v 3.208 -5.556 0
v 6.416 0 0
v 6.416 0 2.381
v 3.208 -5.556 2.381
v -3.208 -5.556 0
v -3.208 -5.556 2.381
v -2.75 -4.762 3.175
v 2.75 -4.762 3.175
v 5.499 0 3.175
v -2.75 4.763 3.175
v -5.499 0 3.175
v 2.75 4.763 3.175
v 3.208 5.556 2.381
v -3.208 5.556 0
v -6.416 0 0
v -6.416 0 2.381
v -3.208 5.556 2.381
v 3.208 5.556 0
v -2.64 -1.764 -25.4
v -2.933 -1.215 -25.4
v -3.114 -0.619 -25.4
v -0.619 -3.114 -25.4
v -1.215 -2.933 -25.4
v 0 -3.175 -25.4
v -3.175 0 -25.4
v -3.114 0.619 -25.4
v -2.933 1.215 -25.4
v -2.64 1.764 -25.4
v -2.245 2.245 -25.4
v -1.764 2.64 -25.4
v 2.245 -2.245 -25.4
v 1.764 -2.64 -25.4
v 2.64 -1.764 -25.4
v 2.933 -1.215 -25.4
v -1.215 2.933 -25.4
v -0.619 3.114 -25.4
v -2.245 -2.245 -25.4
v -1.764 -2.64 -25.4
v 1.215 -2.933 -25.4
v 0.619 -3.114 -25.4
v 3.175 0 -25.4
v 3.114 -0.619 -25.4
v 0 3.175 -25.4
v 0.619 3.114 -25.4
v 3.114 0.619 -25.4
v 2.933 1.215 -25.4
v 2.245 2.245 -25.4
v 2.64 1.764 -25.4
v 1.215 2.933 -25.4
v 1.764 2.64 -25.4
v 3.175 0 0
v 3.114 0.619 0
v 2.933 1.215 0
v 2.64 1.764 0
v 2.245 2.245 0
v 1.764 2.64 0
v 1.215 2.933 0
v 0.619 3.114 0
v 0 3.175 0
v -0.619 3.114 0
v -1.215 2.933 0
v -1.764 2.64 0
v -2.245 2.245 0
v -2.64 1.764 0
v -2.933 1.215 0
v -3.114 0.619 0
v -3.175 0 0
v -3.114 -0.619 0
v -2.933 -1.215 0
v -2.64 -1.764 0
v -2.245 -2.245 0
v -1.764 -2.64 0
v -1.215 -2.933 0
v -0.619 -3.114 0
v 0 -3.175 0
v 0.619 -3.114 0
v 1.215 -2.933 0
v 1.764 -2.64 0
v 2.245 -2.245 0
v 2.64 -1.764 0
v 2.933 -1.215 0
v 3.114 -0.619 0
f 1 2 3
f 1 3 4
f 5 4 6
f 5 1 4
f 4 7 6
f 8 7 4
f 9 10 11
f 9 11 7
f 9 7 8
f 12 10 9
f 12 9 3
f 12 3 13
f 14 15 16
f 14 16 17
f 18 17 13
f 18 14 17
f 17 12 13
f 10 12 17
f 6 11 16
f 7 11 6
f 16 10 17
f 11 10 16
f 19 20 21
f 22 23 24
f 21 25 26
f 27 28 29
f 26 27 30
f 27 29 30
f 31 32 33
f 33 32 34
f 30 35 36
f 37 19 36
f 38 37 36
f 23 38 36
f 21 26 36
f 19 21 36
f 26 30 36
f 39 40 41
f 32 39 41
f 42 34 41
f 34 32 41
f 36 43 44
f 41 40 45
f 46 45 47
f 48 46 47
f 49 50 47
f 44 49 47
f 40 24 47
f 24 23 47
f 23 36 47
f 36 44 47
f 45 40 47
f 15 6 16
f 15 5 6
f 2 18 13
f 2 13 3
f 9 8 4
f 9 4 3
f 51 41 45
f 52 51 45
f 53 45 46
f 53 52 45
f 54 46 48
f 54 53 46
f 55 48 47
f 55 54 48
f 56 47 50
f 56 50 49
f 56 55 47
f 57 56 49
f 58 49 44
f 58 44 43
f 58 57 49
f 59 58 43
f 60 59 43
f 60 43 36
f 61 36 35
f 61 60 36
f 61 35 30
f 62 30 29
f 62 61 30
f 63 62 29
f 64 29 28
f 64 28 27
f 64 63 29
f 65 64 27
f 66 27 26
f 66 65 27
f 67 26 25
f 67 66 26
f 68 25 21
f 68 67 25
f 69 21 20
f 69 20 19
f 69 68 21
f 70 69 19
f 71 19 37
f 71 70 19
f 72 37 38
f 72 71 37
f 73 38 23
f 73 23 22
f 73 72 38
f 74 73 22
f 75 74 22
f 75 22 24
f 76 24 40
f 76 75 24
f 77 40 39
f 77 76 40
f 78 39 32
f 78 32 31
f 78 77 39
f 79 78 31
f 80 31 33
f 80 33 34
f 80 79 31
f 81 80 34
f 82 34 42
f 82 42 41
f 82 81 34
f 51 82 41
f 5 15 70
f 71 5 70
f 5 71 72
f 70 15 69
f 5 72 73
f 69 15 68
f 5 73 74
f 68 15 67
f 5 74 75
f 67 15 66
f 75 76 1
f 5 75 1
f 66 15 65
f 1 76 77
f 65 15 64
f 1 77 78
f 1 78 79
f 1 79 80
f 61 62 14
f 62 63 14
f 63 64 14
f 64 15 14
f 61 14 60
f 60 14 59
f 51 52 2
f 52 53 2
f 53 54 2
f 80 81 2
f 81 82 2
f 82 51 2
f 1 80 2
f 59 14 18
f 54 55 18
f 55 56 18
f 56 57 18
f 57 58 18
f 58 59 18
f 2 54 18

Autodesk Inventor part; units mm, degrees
ref_plane "YZ Plane" through (0, 0, 0) normal (1, 0, 0) x (0, 1, 0)
ref_plane "XZ Plane" through (0, 0, 0) normal (0, 1, 0) x (-1, 0, 0)
ref_plane "XY Plane" through (0, 0, 0) normal (0, 0, 1) x (1, 0, 0)
sketch "Sketch1" plane through (0, 0, 0) normal (0, 0, 1) x (1, 0, 0)
  circle A0 centre (0, 0) radius 3.175
  line L0 (3.2079, 5.5563) -> (6.4158, 0)
  line L1 (6.4158, 0) -> (3.2079, -5.5562)
  line L2 (3.2079, -5.5562) -> (-3.2079, -5.5562)
  line L3 (-3.2079, -5.5562) -> (-6.4158, 0)
  line L4 (-6.4158, 0) -> (-3.2079, 5.5563)
  line L5 (-3.2079, 5.5563) -> (3.2079, 5.5563)
  dimension "d0" = 6.35
  dimension "d1" = 11.1125
extrude "Extrusion1" add sketch "Sketch1" against normal blind 25.4 contours A0
extrude "Extrusion2" add sketch "Sketch1" along normal blind 3.175 contours A0 | L0 L1 L2 L3 L4 L5
thread "Thread1" size "1/4-20 UNC" class "2A" standard "ANSI Unified Screw Threads" full length
chamfer "Chamfer1" distance 0.7937 angle 45 6 edges at (4.8119, 2.7781, 3.175) (0, 5.5563, 3.175) (-4.8119, 2.7781, 3.175) (-4.8119, -2.7781, 3.175) (0, -5.5562, 3.175) (4.8119, -2.7781, 3.175)
properties part number "1_bolt_.25_20"
